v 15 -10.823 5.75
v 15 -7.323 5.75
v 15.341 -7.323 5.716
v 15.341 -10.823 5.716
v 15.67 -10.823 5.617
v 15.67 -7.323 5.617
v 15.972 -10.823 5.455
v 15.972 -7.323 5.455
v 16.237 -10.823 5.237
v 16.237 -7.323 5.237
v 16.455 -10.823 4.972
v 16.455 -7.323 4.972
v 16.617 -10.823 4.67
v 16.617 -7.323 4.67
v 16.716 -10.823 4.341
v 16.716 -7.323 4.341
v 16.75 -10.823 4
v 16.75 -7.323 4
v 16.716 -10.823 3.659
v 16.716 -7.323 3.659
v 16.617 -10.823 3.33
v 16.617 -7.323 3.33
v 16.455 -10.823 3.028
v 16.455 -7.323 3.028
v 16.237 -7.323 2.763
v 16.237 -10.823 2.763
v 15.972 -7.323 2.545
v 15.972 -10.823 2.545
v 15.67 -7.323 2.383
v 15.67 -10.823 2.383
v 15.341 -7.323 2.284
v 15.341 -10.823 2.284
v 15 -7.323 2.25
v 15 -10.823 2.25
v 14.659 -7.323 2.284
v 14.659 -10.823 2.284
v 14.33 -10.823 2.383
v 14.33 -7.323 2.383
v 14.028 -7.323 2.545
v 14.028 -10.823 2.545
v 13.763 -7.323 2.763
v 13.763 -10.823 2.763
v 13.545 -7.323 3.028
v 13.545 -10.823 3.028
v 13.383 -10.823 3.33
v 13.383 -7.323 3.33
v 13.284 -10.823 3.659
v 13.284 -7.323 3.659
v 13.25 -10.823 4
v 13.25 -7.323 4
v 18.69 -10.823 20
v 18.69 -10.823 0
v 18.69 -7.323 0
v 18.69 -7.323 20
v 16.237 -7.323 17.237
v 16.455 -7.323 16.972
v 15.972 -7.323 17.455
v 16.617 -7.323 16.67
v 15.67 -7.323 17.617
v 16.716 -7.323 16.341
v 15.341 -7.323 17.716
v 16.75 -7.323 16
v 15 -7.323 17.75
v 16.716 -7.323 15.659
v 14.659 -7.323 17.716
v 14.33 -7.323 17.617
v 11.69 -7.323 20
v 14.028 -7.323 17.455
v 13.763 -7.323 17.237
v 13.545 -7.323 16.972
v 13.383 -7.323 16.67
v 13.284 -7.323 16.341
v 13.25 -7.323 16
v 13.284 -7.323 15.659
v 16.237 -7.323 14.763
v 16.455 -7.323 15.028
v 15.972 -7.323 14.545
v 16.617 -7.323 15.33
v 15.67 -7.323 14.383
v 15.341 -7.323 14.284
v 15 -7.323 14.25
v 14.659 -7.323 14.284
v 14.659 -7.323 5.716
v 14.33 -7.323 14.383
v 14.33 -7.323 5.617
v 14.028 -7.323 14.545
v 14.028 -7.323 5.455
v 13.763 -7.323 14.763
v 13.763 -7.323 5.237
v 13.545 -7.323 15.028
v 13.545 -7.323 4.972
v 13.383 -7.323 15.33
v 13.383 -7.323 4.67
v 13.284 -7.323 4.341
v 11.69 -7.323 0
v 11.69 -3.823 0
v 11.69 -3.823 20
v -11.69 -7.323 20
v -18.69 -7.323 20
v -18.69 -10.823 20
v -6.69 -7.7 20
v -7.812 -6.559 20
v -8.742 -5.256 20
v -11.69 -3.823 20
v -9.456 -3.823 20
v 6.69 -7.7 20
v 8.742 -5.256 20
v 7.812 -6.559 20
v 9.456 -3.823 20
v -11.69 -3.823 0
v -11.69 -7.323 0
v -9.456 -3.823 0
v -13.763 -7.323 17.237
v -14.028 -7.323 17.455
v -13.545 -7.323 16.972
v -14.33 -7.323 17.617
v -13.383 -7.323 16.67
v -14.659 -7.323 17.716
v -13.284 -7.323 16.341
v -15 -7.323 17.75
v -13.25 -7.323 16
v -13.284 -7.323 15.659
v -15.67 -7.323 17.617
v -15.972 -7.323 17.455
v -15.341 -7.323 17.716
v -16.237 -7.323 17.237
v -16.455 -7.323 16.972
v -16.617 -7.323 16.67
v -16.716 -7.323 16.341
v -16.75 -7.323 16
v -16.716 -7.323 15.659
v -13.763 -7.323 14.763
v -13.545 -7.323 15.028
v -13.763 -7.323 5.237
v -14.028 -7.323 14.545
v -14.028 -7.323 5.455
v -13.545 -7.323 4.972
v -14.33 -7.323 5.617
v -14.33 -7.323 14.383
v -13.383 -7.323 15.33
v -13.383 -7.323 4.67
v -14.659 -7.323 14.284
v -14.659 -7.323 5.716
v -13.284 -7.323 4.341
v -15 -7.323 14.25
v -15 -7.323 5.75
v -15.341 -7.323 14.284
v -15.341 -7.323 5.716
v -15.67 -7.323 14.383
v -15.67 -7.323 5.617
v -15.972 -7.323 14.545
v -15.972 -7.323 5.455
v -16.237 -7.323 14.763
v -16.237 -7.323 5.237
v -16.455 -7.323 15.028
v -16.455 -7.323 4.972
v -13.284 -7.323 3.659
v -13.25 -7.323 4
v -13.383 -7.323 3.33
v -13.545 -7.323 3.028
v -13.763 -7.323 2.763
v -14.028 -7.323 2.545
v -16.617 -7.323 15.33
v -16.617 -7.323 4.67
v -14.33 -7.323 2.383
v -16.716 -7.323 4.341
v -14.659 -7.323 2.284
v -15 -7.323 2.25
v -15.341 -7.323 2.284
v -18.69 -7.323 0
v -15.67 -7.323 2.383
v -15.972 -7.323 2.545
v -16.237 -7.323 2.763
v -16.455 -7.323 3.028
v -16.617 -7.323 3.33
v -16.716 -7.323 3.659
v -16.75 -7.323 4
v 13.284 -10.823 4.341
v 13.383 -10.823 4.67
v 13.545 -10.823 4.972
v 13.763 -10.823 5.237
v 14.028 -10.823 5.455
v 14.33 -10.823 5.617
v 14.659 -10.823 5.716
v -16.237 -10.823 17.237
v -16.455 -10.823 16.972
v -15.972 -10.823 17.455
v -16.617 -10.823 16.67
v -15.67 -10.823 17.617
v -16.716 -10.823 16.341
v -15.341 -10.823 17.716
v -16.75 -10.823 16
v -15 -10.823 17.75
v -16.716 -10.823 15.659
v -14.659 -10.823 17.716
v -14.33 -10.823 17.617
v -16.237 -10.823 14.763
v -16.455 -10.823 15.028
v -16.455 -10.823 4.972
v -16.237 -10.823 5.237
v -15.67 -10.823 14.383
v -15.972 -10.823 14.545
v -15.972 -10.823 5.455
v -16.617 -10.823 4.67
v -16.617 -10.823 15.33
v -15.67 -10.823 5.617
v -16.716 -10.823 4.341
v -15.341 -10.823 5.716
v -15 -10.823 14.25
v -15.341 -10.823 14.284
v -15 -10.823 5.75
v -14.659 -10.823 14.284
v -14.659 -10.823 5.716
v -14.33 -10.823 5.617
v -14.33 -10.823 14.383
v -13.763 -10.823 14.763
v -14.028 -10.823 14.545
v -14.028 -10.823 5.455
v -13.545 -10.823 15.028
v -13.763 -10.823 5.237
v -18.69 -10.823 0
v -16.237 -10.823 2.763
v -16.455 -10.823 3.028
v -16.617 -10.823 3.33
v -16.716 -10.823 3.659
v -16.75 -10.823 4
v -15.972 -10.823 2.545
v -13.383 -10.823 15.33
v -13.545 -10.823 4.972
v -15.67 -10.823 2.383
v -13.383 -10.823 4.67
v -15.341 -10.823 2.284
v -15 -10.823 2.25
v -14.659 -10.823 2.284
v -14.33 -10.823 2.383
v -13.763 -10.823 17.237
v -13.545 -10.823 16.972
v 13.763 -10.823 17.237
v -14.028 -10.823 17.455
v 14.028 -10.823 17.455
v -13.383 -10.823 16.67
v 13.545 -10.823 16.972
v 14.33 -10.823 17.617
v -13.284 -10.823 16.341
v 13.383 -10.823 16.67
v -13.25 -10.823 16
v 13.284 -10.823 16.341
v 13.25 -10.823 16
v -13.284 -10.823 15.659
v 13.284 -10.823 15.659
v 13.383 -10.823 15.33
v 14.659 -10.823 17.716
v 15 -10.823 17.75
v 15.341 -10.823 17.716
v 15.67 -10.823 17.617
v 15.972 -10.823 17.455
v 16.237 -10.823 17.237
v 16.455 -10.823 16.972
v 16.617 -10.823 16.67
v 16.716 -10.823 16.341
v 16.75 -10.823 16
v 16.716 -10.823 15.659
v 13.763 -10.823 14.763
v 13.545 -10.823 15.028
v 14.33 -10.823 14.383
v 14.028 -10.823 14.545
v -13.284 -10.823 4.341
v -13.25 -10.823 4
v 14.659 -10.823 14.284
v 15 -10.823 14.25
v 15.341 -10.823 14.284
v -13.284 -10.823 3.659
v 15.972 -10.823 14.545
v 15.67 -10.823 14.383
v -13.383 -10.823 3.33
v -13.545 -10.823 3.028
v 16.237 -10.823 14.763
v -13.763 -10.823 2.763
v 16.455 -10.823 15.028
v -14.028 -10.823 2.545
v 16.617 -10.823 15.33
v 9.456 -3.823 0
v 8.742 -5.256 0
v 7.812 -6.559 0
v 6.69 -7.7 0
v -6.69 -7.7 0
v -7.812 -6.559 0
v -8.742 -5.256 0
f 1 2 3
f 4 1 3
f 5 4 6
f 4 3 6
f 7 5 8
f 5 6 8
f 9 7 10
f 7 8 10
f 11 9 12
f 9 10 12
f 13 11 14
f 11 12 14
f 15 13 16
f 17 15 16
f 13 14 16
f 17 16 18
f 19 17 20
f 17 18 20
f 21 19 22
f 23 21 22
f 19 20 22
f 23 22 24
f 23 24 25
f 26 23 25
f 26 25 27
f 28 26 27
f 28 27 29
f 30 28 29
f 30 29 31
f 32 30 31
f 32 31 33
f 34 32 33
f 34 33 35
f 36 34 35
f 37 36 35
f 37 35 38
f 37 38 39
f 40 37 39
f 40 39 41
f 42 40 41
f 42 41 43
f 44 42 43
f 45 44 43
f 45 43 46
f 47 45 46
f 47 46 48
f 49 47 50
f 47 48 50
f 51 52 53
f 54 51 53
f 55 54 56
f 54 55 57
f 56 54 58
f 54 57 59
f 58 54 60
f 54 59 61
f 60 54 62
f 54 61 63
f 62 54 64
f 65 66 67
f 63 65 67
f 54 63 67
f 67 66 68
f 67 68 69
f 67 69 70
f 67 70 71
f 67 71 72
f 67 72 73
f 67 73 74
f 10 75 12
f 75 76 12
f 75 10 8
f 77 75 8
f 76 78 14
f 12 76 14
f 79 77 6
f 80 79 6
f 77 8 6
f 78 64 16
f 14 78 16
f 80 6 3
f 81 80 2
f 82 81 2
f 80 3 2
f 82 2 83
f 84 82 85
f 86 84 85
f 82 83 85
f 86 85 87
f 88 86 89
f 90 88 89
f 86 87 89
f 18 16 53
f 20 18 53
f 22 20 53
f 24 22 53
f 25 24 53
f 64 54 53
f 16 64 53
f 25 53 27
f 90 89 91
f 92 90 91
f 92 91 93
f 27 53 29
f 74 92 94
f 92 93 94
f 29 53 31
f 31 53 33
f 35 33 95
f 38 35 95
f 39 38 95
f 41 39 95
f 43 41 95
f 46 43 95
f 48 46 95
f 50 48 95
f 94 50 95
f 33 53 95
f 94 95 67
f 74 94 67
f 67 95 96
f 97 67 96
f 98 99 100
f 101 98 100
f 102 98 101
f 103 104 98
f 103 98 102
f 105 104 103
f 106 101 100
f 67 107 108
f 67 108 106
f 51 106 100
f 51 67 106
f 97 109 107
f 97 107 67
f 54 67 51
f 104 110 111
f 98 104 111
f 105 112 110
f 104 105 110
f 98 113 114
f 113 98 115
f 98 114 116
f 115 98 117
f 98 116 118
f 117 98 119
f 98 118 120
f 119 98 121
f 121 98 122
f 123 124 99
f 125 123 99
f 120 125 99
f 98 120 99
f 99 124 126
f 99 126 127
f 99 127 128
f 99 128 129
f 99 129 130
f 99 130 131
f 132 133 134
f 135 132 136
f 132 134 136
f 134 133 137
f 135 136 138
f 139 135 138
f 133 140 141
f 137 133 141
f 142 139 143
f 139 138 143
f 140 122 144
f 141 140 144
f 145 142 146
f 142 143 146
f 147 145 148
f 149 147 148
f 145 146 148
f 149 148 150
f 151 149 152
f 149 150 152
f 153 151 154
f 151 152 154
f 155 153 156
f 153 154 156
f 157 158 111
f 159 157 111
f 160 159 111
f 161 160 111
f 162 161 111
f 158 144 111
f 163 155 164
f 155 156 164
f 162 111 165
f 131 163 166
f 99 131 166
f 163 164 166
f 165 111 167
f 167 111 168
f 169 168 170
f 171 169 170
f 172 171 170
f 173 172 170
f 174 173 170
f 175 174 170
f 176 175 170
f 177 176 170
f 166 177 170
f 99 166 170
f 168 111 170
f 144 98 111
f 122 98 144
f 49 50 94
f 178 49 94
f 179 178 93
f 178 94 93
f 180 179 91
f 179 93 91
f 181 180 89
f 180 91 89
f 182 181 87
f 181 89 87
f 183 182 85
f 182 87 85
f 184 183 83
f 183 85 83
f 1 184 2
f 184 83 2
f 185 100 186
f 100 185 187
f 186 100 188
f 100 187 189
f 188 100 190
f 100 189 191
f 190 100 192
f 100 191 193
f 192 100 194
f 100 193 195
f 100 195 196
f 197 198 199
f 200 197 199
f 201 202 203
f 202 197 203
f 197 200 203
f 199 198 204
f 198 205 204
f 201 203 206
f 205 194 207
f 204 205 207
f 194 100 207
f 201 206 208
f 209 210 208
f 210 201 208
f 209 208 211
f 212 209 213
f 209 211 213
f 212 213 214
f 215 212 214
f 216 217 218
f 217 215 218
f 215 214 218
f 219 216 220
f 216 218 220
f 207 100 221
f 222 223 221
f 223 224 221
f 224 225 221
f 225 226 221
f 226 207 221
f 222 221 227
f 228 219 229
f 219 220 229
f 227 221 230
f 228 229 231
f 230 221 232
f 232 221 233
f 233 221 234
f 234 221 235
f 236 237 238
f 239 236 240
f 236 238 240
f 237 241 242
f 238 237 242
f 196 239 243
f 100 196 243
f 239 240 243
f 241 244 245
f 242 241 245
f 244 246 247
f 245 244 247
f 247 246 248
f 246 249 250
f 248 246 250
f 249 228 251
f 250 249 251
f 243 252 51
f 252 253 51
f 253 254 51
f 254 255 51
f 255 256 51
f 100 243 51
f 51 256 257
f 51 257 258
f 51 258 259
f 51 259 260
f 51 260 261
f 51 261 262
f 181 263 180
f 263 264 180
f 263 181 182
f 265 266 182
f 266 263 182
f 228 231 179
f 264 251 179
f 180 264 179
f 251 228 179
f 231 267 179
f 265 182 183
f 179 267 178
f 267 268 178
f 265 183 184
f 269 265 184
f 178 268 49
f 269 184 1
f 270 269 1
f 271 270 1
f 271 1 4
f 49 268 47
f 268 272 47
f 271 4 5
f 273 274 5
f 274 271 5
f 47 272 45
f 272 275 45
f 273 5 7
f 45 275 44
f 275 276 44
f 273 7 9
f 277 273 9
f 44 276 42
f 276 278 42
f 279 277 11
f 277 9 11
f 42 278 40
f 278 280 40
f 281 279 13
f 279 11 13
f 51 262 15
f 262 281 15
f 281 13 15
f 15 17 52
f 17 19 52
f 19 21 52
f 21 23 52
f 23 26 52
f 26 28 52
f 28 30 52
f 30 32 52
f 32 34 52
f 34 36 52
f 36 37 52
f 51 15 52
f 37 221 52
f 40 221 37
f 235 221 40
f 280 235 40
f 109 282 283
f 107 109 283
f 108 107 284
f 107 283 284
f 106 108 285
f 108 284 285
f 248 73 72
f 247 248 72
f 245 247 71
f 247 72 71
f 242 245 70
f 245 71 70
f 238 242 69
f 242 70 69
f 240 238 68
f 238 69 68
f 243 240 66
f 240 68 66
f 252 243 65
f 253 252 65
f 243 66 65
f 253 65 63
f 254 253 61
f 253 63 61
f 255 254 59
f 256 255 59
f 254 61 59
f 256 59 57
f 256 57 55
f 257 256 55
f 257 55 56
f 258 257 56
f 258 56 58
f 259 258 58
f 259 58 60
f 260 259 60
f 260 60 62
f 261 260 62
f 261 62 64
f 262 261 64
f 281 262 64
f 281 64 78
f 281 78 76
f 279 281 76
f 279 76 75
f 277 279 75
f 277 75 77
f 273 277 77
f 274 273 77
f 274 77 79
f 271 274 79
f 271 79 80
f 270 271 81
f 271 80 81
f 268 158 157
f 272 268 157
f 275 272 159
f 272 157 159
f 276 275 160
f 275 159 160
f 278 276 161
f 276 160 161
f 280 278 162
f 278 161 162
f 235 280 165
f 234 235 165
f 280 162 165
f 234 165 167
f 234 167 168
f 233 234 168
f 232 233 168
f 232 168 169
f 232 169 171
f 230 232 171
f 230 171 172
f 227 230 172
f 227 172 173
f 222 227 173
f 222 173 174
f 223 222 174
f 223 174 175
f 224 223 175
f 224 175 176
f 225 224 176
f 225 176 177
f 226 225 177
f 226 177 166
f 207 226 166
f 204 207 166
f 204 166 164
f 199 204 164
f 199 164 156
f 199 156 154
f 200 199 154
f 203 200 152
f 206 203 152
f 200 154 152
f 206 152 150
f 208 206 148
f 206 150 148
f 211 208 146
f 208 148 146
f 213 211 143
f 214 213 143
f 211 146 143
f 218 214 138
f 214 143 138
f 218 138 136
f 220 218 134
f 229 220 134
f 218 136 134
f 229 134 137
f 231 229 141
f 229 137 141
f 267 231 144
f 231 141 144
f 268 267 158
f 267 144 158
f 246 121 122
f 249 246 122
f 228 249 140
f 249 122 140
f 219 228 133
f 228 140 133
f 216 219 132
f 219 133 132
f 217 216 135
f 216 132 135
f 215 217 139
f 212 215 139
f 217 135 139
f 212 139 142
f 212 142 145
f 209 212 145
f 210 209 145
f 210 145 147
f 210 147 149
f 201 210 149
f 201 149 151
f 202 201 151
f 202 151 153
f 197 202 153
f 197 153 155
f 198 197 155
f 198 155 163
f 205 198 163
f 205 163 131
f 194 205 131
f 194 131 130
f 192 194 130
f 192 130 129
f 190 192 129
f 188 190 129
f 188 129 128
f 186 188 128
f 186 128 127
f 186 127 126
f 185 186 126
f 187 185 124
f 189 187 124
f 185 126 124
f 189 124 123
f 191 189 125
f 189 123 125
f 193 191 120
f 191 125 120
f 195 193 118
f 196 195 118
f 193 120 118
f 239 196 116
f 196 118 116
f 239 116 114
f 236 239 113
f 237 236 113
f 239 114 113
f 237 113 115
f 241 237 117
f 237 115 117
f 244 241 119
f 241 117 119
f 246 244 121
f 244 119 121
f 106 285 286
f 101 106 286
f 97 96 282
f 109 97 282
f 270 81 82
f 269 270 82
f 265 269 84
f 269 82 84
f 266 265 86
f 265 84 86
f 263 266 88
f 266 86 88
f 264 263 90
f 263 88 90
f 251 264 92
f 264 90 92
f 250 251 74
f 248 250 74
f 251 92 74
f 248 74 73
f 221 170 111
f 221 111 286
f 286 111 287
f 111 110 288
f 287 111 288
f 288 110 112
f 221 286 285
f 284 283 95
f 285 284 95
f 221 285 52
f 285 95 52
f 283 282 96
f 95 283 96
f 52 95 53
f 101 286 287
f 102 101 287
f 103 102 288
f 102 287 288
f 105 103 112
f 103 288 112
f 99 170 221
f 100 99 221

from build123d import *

# Parameters (mm, degrees)
F1_DEPTH = 20
F2_DEPTH = 2
F4_DEPTH = 25


with BuildPart() as f1:
    # F0 (on Top) → F1 (new body)
    with BuildSketch(Plane.XY):
        with BuildLine():
            ThreePointArc((-6.689544, -7.7), (-8.302401, -5.92538), (-9.456362, -3.823248))
            Line((-9.456362, -3.823248), (-11.689544, -3.823248))
            Line((-11.689544, -3.823248), (-11.689544, -7.323248))
            Line((-11.689544, -7.323248), (-18.689544, -7.323248))
            Line((-18.689544, -7.323248), (-18.689544, -10.823248))
            Line((-18.689544, -10.823248), (18.689544, -10.823248))
            Line((18.689544, -10.823248), (18.689544, -7.323248))
            Line((18.689544, -7.323248), (11.689544, -7.323248))
            Line((11.689544, -7.323248), (11.689544, -3.823248))
            Line((11.689544, -3.823248), (9.456362, -3.823248))
            ThreePointArc((9.456362, -3.823248), (8.302401, -5.92538), (6.689544, -7.7))
            Line((6.689544, -7.7), (-6.689544, -7.7))
        make_face()
    extrude(amount=F1_DEPTH)

    # F0 (on Top) → F2 (join)
    with BuildSketch(Plane.XY):
        with BuildLine():
            ThreePointArc((-6.689544, -7.7), (-8.302401, -5.92538), (-9.456362, -3.823248))
            Line((-9.456362, -3.823248), (-11.689544, -3.823248))
            Line((-11.689544, -3.823248), (-11.689544, -7.323248))
            Line((-11.689544, -7.323248), (-18.689544, -7.323248))
            Line((-18.689544, -7.323248), (-18.689544, -10.823248))
            Line((-18.689544, -10.823248), (18.689544, -10.823248))
            Line((18.689544, -10.823248), (18.689544, -7.323248))
            Line((18.689544, -7.323248), (11.689544, -7.323248))
            Line((11.689544, -7.323248), (11.689544, -3.823248))
            Line((11.689544, -3.823248), (9.456362, -3.823248))
            ThreePointArc((9.456362, -3.823248), (8.302401, -5.92538), (6.689544, -7.7))
            Line((6.689544, -7.7), (-6.689544, -7.7))
        make_face()
    extrude(amount=F2_DEPTH)

    # F3 (on face) → F4 (cut)
    with BuildSketch(Plane(origin=(0, -7.323248, 0), x_dir=(-1, 0, 0), z_dir=(0, 1, 0))):
        with BuildLine():
            Line((-13.25, 16), (-15, 16))
            Line((-15, 16), (-15, 14.25))
            ThreePointArc((-15, 14.25), (-13.762563, 14.762563), (-13.25, 16))
        make_face()
        with BuildLine():
            Line((-15, 14.25), (-15, 16))
            Line((-15, 16), (-13.25, 16))
            ThreePointArc((-13.25, 16), (-16.237437, 17.237437), (-15, 14.25))
        make_face()
        with BuildLine():
            ThreePointArc((16.75, 4), (15, 5.75), (13.25, 4))
            ThreePointArc((13.25, 4), (15, 2.25), (16.75, 4))
        make_face()
        with BuildLine():
            ThreePointArc((-13.25, 4), (-13.762563, 5.237437), (-15, 5.75))
            Line((-15, 5.75), (-15, 4))
            Line((-15, 4), (-13.25, 4))
        make_face()
        with BuildLine():
            Line((-15, 4), (-15, 5.75))
            ThreePointArc((-15, 5.75), (-16.237437, 2.762563), (-13.25, 4))
            Line((-13.25, 4), (-15, 4))
        make_face()
        with BuildLine():
            ThreePointArc((16.75, 16), (15, 17.75), (13.25, 16))
            ThreePointArc((13.25, 16), (15, 14.25), (16.75, 16))
        make_face()
    extrude(amount=-F4_DEPTH, mode=Mode.SUBTRACT)


solid = f1.part
